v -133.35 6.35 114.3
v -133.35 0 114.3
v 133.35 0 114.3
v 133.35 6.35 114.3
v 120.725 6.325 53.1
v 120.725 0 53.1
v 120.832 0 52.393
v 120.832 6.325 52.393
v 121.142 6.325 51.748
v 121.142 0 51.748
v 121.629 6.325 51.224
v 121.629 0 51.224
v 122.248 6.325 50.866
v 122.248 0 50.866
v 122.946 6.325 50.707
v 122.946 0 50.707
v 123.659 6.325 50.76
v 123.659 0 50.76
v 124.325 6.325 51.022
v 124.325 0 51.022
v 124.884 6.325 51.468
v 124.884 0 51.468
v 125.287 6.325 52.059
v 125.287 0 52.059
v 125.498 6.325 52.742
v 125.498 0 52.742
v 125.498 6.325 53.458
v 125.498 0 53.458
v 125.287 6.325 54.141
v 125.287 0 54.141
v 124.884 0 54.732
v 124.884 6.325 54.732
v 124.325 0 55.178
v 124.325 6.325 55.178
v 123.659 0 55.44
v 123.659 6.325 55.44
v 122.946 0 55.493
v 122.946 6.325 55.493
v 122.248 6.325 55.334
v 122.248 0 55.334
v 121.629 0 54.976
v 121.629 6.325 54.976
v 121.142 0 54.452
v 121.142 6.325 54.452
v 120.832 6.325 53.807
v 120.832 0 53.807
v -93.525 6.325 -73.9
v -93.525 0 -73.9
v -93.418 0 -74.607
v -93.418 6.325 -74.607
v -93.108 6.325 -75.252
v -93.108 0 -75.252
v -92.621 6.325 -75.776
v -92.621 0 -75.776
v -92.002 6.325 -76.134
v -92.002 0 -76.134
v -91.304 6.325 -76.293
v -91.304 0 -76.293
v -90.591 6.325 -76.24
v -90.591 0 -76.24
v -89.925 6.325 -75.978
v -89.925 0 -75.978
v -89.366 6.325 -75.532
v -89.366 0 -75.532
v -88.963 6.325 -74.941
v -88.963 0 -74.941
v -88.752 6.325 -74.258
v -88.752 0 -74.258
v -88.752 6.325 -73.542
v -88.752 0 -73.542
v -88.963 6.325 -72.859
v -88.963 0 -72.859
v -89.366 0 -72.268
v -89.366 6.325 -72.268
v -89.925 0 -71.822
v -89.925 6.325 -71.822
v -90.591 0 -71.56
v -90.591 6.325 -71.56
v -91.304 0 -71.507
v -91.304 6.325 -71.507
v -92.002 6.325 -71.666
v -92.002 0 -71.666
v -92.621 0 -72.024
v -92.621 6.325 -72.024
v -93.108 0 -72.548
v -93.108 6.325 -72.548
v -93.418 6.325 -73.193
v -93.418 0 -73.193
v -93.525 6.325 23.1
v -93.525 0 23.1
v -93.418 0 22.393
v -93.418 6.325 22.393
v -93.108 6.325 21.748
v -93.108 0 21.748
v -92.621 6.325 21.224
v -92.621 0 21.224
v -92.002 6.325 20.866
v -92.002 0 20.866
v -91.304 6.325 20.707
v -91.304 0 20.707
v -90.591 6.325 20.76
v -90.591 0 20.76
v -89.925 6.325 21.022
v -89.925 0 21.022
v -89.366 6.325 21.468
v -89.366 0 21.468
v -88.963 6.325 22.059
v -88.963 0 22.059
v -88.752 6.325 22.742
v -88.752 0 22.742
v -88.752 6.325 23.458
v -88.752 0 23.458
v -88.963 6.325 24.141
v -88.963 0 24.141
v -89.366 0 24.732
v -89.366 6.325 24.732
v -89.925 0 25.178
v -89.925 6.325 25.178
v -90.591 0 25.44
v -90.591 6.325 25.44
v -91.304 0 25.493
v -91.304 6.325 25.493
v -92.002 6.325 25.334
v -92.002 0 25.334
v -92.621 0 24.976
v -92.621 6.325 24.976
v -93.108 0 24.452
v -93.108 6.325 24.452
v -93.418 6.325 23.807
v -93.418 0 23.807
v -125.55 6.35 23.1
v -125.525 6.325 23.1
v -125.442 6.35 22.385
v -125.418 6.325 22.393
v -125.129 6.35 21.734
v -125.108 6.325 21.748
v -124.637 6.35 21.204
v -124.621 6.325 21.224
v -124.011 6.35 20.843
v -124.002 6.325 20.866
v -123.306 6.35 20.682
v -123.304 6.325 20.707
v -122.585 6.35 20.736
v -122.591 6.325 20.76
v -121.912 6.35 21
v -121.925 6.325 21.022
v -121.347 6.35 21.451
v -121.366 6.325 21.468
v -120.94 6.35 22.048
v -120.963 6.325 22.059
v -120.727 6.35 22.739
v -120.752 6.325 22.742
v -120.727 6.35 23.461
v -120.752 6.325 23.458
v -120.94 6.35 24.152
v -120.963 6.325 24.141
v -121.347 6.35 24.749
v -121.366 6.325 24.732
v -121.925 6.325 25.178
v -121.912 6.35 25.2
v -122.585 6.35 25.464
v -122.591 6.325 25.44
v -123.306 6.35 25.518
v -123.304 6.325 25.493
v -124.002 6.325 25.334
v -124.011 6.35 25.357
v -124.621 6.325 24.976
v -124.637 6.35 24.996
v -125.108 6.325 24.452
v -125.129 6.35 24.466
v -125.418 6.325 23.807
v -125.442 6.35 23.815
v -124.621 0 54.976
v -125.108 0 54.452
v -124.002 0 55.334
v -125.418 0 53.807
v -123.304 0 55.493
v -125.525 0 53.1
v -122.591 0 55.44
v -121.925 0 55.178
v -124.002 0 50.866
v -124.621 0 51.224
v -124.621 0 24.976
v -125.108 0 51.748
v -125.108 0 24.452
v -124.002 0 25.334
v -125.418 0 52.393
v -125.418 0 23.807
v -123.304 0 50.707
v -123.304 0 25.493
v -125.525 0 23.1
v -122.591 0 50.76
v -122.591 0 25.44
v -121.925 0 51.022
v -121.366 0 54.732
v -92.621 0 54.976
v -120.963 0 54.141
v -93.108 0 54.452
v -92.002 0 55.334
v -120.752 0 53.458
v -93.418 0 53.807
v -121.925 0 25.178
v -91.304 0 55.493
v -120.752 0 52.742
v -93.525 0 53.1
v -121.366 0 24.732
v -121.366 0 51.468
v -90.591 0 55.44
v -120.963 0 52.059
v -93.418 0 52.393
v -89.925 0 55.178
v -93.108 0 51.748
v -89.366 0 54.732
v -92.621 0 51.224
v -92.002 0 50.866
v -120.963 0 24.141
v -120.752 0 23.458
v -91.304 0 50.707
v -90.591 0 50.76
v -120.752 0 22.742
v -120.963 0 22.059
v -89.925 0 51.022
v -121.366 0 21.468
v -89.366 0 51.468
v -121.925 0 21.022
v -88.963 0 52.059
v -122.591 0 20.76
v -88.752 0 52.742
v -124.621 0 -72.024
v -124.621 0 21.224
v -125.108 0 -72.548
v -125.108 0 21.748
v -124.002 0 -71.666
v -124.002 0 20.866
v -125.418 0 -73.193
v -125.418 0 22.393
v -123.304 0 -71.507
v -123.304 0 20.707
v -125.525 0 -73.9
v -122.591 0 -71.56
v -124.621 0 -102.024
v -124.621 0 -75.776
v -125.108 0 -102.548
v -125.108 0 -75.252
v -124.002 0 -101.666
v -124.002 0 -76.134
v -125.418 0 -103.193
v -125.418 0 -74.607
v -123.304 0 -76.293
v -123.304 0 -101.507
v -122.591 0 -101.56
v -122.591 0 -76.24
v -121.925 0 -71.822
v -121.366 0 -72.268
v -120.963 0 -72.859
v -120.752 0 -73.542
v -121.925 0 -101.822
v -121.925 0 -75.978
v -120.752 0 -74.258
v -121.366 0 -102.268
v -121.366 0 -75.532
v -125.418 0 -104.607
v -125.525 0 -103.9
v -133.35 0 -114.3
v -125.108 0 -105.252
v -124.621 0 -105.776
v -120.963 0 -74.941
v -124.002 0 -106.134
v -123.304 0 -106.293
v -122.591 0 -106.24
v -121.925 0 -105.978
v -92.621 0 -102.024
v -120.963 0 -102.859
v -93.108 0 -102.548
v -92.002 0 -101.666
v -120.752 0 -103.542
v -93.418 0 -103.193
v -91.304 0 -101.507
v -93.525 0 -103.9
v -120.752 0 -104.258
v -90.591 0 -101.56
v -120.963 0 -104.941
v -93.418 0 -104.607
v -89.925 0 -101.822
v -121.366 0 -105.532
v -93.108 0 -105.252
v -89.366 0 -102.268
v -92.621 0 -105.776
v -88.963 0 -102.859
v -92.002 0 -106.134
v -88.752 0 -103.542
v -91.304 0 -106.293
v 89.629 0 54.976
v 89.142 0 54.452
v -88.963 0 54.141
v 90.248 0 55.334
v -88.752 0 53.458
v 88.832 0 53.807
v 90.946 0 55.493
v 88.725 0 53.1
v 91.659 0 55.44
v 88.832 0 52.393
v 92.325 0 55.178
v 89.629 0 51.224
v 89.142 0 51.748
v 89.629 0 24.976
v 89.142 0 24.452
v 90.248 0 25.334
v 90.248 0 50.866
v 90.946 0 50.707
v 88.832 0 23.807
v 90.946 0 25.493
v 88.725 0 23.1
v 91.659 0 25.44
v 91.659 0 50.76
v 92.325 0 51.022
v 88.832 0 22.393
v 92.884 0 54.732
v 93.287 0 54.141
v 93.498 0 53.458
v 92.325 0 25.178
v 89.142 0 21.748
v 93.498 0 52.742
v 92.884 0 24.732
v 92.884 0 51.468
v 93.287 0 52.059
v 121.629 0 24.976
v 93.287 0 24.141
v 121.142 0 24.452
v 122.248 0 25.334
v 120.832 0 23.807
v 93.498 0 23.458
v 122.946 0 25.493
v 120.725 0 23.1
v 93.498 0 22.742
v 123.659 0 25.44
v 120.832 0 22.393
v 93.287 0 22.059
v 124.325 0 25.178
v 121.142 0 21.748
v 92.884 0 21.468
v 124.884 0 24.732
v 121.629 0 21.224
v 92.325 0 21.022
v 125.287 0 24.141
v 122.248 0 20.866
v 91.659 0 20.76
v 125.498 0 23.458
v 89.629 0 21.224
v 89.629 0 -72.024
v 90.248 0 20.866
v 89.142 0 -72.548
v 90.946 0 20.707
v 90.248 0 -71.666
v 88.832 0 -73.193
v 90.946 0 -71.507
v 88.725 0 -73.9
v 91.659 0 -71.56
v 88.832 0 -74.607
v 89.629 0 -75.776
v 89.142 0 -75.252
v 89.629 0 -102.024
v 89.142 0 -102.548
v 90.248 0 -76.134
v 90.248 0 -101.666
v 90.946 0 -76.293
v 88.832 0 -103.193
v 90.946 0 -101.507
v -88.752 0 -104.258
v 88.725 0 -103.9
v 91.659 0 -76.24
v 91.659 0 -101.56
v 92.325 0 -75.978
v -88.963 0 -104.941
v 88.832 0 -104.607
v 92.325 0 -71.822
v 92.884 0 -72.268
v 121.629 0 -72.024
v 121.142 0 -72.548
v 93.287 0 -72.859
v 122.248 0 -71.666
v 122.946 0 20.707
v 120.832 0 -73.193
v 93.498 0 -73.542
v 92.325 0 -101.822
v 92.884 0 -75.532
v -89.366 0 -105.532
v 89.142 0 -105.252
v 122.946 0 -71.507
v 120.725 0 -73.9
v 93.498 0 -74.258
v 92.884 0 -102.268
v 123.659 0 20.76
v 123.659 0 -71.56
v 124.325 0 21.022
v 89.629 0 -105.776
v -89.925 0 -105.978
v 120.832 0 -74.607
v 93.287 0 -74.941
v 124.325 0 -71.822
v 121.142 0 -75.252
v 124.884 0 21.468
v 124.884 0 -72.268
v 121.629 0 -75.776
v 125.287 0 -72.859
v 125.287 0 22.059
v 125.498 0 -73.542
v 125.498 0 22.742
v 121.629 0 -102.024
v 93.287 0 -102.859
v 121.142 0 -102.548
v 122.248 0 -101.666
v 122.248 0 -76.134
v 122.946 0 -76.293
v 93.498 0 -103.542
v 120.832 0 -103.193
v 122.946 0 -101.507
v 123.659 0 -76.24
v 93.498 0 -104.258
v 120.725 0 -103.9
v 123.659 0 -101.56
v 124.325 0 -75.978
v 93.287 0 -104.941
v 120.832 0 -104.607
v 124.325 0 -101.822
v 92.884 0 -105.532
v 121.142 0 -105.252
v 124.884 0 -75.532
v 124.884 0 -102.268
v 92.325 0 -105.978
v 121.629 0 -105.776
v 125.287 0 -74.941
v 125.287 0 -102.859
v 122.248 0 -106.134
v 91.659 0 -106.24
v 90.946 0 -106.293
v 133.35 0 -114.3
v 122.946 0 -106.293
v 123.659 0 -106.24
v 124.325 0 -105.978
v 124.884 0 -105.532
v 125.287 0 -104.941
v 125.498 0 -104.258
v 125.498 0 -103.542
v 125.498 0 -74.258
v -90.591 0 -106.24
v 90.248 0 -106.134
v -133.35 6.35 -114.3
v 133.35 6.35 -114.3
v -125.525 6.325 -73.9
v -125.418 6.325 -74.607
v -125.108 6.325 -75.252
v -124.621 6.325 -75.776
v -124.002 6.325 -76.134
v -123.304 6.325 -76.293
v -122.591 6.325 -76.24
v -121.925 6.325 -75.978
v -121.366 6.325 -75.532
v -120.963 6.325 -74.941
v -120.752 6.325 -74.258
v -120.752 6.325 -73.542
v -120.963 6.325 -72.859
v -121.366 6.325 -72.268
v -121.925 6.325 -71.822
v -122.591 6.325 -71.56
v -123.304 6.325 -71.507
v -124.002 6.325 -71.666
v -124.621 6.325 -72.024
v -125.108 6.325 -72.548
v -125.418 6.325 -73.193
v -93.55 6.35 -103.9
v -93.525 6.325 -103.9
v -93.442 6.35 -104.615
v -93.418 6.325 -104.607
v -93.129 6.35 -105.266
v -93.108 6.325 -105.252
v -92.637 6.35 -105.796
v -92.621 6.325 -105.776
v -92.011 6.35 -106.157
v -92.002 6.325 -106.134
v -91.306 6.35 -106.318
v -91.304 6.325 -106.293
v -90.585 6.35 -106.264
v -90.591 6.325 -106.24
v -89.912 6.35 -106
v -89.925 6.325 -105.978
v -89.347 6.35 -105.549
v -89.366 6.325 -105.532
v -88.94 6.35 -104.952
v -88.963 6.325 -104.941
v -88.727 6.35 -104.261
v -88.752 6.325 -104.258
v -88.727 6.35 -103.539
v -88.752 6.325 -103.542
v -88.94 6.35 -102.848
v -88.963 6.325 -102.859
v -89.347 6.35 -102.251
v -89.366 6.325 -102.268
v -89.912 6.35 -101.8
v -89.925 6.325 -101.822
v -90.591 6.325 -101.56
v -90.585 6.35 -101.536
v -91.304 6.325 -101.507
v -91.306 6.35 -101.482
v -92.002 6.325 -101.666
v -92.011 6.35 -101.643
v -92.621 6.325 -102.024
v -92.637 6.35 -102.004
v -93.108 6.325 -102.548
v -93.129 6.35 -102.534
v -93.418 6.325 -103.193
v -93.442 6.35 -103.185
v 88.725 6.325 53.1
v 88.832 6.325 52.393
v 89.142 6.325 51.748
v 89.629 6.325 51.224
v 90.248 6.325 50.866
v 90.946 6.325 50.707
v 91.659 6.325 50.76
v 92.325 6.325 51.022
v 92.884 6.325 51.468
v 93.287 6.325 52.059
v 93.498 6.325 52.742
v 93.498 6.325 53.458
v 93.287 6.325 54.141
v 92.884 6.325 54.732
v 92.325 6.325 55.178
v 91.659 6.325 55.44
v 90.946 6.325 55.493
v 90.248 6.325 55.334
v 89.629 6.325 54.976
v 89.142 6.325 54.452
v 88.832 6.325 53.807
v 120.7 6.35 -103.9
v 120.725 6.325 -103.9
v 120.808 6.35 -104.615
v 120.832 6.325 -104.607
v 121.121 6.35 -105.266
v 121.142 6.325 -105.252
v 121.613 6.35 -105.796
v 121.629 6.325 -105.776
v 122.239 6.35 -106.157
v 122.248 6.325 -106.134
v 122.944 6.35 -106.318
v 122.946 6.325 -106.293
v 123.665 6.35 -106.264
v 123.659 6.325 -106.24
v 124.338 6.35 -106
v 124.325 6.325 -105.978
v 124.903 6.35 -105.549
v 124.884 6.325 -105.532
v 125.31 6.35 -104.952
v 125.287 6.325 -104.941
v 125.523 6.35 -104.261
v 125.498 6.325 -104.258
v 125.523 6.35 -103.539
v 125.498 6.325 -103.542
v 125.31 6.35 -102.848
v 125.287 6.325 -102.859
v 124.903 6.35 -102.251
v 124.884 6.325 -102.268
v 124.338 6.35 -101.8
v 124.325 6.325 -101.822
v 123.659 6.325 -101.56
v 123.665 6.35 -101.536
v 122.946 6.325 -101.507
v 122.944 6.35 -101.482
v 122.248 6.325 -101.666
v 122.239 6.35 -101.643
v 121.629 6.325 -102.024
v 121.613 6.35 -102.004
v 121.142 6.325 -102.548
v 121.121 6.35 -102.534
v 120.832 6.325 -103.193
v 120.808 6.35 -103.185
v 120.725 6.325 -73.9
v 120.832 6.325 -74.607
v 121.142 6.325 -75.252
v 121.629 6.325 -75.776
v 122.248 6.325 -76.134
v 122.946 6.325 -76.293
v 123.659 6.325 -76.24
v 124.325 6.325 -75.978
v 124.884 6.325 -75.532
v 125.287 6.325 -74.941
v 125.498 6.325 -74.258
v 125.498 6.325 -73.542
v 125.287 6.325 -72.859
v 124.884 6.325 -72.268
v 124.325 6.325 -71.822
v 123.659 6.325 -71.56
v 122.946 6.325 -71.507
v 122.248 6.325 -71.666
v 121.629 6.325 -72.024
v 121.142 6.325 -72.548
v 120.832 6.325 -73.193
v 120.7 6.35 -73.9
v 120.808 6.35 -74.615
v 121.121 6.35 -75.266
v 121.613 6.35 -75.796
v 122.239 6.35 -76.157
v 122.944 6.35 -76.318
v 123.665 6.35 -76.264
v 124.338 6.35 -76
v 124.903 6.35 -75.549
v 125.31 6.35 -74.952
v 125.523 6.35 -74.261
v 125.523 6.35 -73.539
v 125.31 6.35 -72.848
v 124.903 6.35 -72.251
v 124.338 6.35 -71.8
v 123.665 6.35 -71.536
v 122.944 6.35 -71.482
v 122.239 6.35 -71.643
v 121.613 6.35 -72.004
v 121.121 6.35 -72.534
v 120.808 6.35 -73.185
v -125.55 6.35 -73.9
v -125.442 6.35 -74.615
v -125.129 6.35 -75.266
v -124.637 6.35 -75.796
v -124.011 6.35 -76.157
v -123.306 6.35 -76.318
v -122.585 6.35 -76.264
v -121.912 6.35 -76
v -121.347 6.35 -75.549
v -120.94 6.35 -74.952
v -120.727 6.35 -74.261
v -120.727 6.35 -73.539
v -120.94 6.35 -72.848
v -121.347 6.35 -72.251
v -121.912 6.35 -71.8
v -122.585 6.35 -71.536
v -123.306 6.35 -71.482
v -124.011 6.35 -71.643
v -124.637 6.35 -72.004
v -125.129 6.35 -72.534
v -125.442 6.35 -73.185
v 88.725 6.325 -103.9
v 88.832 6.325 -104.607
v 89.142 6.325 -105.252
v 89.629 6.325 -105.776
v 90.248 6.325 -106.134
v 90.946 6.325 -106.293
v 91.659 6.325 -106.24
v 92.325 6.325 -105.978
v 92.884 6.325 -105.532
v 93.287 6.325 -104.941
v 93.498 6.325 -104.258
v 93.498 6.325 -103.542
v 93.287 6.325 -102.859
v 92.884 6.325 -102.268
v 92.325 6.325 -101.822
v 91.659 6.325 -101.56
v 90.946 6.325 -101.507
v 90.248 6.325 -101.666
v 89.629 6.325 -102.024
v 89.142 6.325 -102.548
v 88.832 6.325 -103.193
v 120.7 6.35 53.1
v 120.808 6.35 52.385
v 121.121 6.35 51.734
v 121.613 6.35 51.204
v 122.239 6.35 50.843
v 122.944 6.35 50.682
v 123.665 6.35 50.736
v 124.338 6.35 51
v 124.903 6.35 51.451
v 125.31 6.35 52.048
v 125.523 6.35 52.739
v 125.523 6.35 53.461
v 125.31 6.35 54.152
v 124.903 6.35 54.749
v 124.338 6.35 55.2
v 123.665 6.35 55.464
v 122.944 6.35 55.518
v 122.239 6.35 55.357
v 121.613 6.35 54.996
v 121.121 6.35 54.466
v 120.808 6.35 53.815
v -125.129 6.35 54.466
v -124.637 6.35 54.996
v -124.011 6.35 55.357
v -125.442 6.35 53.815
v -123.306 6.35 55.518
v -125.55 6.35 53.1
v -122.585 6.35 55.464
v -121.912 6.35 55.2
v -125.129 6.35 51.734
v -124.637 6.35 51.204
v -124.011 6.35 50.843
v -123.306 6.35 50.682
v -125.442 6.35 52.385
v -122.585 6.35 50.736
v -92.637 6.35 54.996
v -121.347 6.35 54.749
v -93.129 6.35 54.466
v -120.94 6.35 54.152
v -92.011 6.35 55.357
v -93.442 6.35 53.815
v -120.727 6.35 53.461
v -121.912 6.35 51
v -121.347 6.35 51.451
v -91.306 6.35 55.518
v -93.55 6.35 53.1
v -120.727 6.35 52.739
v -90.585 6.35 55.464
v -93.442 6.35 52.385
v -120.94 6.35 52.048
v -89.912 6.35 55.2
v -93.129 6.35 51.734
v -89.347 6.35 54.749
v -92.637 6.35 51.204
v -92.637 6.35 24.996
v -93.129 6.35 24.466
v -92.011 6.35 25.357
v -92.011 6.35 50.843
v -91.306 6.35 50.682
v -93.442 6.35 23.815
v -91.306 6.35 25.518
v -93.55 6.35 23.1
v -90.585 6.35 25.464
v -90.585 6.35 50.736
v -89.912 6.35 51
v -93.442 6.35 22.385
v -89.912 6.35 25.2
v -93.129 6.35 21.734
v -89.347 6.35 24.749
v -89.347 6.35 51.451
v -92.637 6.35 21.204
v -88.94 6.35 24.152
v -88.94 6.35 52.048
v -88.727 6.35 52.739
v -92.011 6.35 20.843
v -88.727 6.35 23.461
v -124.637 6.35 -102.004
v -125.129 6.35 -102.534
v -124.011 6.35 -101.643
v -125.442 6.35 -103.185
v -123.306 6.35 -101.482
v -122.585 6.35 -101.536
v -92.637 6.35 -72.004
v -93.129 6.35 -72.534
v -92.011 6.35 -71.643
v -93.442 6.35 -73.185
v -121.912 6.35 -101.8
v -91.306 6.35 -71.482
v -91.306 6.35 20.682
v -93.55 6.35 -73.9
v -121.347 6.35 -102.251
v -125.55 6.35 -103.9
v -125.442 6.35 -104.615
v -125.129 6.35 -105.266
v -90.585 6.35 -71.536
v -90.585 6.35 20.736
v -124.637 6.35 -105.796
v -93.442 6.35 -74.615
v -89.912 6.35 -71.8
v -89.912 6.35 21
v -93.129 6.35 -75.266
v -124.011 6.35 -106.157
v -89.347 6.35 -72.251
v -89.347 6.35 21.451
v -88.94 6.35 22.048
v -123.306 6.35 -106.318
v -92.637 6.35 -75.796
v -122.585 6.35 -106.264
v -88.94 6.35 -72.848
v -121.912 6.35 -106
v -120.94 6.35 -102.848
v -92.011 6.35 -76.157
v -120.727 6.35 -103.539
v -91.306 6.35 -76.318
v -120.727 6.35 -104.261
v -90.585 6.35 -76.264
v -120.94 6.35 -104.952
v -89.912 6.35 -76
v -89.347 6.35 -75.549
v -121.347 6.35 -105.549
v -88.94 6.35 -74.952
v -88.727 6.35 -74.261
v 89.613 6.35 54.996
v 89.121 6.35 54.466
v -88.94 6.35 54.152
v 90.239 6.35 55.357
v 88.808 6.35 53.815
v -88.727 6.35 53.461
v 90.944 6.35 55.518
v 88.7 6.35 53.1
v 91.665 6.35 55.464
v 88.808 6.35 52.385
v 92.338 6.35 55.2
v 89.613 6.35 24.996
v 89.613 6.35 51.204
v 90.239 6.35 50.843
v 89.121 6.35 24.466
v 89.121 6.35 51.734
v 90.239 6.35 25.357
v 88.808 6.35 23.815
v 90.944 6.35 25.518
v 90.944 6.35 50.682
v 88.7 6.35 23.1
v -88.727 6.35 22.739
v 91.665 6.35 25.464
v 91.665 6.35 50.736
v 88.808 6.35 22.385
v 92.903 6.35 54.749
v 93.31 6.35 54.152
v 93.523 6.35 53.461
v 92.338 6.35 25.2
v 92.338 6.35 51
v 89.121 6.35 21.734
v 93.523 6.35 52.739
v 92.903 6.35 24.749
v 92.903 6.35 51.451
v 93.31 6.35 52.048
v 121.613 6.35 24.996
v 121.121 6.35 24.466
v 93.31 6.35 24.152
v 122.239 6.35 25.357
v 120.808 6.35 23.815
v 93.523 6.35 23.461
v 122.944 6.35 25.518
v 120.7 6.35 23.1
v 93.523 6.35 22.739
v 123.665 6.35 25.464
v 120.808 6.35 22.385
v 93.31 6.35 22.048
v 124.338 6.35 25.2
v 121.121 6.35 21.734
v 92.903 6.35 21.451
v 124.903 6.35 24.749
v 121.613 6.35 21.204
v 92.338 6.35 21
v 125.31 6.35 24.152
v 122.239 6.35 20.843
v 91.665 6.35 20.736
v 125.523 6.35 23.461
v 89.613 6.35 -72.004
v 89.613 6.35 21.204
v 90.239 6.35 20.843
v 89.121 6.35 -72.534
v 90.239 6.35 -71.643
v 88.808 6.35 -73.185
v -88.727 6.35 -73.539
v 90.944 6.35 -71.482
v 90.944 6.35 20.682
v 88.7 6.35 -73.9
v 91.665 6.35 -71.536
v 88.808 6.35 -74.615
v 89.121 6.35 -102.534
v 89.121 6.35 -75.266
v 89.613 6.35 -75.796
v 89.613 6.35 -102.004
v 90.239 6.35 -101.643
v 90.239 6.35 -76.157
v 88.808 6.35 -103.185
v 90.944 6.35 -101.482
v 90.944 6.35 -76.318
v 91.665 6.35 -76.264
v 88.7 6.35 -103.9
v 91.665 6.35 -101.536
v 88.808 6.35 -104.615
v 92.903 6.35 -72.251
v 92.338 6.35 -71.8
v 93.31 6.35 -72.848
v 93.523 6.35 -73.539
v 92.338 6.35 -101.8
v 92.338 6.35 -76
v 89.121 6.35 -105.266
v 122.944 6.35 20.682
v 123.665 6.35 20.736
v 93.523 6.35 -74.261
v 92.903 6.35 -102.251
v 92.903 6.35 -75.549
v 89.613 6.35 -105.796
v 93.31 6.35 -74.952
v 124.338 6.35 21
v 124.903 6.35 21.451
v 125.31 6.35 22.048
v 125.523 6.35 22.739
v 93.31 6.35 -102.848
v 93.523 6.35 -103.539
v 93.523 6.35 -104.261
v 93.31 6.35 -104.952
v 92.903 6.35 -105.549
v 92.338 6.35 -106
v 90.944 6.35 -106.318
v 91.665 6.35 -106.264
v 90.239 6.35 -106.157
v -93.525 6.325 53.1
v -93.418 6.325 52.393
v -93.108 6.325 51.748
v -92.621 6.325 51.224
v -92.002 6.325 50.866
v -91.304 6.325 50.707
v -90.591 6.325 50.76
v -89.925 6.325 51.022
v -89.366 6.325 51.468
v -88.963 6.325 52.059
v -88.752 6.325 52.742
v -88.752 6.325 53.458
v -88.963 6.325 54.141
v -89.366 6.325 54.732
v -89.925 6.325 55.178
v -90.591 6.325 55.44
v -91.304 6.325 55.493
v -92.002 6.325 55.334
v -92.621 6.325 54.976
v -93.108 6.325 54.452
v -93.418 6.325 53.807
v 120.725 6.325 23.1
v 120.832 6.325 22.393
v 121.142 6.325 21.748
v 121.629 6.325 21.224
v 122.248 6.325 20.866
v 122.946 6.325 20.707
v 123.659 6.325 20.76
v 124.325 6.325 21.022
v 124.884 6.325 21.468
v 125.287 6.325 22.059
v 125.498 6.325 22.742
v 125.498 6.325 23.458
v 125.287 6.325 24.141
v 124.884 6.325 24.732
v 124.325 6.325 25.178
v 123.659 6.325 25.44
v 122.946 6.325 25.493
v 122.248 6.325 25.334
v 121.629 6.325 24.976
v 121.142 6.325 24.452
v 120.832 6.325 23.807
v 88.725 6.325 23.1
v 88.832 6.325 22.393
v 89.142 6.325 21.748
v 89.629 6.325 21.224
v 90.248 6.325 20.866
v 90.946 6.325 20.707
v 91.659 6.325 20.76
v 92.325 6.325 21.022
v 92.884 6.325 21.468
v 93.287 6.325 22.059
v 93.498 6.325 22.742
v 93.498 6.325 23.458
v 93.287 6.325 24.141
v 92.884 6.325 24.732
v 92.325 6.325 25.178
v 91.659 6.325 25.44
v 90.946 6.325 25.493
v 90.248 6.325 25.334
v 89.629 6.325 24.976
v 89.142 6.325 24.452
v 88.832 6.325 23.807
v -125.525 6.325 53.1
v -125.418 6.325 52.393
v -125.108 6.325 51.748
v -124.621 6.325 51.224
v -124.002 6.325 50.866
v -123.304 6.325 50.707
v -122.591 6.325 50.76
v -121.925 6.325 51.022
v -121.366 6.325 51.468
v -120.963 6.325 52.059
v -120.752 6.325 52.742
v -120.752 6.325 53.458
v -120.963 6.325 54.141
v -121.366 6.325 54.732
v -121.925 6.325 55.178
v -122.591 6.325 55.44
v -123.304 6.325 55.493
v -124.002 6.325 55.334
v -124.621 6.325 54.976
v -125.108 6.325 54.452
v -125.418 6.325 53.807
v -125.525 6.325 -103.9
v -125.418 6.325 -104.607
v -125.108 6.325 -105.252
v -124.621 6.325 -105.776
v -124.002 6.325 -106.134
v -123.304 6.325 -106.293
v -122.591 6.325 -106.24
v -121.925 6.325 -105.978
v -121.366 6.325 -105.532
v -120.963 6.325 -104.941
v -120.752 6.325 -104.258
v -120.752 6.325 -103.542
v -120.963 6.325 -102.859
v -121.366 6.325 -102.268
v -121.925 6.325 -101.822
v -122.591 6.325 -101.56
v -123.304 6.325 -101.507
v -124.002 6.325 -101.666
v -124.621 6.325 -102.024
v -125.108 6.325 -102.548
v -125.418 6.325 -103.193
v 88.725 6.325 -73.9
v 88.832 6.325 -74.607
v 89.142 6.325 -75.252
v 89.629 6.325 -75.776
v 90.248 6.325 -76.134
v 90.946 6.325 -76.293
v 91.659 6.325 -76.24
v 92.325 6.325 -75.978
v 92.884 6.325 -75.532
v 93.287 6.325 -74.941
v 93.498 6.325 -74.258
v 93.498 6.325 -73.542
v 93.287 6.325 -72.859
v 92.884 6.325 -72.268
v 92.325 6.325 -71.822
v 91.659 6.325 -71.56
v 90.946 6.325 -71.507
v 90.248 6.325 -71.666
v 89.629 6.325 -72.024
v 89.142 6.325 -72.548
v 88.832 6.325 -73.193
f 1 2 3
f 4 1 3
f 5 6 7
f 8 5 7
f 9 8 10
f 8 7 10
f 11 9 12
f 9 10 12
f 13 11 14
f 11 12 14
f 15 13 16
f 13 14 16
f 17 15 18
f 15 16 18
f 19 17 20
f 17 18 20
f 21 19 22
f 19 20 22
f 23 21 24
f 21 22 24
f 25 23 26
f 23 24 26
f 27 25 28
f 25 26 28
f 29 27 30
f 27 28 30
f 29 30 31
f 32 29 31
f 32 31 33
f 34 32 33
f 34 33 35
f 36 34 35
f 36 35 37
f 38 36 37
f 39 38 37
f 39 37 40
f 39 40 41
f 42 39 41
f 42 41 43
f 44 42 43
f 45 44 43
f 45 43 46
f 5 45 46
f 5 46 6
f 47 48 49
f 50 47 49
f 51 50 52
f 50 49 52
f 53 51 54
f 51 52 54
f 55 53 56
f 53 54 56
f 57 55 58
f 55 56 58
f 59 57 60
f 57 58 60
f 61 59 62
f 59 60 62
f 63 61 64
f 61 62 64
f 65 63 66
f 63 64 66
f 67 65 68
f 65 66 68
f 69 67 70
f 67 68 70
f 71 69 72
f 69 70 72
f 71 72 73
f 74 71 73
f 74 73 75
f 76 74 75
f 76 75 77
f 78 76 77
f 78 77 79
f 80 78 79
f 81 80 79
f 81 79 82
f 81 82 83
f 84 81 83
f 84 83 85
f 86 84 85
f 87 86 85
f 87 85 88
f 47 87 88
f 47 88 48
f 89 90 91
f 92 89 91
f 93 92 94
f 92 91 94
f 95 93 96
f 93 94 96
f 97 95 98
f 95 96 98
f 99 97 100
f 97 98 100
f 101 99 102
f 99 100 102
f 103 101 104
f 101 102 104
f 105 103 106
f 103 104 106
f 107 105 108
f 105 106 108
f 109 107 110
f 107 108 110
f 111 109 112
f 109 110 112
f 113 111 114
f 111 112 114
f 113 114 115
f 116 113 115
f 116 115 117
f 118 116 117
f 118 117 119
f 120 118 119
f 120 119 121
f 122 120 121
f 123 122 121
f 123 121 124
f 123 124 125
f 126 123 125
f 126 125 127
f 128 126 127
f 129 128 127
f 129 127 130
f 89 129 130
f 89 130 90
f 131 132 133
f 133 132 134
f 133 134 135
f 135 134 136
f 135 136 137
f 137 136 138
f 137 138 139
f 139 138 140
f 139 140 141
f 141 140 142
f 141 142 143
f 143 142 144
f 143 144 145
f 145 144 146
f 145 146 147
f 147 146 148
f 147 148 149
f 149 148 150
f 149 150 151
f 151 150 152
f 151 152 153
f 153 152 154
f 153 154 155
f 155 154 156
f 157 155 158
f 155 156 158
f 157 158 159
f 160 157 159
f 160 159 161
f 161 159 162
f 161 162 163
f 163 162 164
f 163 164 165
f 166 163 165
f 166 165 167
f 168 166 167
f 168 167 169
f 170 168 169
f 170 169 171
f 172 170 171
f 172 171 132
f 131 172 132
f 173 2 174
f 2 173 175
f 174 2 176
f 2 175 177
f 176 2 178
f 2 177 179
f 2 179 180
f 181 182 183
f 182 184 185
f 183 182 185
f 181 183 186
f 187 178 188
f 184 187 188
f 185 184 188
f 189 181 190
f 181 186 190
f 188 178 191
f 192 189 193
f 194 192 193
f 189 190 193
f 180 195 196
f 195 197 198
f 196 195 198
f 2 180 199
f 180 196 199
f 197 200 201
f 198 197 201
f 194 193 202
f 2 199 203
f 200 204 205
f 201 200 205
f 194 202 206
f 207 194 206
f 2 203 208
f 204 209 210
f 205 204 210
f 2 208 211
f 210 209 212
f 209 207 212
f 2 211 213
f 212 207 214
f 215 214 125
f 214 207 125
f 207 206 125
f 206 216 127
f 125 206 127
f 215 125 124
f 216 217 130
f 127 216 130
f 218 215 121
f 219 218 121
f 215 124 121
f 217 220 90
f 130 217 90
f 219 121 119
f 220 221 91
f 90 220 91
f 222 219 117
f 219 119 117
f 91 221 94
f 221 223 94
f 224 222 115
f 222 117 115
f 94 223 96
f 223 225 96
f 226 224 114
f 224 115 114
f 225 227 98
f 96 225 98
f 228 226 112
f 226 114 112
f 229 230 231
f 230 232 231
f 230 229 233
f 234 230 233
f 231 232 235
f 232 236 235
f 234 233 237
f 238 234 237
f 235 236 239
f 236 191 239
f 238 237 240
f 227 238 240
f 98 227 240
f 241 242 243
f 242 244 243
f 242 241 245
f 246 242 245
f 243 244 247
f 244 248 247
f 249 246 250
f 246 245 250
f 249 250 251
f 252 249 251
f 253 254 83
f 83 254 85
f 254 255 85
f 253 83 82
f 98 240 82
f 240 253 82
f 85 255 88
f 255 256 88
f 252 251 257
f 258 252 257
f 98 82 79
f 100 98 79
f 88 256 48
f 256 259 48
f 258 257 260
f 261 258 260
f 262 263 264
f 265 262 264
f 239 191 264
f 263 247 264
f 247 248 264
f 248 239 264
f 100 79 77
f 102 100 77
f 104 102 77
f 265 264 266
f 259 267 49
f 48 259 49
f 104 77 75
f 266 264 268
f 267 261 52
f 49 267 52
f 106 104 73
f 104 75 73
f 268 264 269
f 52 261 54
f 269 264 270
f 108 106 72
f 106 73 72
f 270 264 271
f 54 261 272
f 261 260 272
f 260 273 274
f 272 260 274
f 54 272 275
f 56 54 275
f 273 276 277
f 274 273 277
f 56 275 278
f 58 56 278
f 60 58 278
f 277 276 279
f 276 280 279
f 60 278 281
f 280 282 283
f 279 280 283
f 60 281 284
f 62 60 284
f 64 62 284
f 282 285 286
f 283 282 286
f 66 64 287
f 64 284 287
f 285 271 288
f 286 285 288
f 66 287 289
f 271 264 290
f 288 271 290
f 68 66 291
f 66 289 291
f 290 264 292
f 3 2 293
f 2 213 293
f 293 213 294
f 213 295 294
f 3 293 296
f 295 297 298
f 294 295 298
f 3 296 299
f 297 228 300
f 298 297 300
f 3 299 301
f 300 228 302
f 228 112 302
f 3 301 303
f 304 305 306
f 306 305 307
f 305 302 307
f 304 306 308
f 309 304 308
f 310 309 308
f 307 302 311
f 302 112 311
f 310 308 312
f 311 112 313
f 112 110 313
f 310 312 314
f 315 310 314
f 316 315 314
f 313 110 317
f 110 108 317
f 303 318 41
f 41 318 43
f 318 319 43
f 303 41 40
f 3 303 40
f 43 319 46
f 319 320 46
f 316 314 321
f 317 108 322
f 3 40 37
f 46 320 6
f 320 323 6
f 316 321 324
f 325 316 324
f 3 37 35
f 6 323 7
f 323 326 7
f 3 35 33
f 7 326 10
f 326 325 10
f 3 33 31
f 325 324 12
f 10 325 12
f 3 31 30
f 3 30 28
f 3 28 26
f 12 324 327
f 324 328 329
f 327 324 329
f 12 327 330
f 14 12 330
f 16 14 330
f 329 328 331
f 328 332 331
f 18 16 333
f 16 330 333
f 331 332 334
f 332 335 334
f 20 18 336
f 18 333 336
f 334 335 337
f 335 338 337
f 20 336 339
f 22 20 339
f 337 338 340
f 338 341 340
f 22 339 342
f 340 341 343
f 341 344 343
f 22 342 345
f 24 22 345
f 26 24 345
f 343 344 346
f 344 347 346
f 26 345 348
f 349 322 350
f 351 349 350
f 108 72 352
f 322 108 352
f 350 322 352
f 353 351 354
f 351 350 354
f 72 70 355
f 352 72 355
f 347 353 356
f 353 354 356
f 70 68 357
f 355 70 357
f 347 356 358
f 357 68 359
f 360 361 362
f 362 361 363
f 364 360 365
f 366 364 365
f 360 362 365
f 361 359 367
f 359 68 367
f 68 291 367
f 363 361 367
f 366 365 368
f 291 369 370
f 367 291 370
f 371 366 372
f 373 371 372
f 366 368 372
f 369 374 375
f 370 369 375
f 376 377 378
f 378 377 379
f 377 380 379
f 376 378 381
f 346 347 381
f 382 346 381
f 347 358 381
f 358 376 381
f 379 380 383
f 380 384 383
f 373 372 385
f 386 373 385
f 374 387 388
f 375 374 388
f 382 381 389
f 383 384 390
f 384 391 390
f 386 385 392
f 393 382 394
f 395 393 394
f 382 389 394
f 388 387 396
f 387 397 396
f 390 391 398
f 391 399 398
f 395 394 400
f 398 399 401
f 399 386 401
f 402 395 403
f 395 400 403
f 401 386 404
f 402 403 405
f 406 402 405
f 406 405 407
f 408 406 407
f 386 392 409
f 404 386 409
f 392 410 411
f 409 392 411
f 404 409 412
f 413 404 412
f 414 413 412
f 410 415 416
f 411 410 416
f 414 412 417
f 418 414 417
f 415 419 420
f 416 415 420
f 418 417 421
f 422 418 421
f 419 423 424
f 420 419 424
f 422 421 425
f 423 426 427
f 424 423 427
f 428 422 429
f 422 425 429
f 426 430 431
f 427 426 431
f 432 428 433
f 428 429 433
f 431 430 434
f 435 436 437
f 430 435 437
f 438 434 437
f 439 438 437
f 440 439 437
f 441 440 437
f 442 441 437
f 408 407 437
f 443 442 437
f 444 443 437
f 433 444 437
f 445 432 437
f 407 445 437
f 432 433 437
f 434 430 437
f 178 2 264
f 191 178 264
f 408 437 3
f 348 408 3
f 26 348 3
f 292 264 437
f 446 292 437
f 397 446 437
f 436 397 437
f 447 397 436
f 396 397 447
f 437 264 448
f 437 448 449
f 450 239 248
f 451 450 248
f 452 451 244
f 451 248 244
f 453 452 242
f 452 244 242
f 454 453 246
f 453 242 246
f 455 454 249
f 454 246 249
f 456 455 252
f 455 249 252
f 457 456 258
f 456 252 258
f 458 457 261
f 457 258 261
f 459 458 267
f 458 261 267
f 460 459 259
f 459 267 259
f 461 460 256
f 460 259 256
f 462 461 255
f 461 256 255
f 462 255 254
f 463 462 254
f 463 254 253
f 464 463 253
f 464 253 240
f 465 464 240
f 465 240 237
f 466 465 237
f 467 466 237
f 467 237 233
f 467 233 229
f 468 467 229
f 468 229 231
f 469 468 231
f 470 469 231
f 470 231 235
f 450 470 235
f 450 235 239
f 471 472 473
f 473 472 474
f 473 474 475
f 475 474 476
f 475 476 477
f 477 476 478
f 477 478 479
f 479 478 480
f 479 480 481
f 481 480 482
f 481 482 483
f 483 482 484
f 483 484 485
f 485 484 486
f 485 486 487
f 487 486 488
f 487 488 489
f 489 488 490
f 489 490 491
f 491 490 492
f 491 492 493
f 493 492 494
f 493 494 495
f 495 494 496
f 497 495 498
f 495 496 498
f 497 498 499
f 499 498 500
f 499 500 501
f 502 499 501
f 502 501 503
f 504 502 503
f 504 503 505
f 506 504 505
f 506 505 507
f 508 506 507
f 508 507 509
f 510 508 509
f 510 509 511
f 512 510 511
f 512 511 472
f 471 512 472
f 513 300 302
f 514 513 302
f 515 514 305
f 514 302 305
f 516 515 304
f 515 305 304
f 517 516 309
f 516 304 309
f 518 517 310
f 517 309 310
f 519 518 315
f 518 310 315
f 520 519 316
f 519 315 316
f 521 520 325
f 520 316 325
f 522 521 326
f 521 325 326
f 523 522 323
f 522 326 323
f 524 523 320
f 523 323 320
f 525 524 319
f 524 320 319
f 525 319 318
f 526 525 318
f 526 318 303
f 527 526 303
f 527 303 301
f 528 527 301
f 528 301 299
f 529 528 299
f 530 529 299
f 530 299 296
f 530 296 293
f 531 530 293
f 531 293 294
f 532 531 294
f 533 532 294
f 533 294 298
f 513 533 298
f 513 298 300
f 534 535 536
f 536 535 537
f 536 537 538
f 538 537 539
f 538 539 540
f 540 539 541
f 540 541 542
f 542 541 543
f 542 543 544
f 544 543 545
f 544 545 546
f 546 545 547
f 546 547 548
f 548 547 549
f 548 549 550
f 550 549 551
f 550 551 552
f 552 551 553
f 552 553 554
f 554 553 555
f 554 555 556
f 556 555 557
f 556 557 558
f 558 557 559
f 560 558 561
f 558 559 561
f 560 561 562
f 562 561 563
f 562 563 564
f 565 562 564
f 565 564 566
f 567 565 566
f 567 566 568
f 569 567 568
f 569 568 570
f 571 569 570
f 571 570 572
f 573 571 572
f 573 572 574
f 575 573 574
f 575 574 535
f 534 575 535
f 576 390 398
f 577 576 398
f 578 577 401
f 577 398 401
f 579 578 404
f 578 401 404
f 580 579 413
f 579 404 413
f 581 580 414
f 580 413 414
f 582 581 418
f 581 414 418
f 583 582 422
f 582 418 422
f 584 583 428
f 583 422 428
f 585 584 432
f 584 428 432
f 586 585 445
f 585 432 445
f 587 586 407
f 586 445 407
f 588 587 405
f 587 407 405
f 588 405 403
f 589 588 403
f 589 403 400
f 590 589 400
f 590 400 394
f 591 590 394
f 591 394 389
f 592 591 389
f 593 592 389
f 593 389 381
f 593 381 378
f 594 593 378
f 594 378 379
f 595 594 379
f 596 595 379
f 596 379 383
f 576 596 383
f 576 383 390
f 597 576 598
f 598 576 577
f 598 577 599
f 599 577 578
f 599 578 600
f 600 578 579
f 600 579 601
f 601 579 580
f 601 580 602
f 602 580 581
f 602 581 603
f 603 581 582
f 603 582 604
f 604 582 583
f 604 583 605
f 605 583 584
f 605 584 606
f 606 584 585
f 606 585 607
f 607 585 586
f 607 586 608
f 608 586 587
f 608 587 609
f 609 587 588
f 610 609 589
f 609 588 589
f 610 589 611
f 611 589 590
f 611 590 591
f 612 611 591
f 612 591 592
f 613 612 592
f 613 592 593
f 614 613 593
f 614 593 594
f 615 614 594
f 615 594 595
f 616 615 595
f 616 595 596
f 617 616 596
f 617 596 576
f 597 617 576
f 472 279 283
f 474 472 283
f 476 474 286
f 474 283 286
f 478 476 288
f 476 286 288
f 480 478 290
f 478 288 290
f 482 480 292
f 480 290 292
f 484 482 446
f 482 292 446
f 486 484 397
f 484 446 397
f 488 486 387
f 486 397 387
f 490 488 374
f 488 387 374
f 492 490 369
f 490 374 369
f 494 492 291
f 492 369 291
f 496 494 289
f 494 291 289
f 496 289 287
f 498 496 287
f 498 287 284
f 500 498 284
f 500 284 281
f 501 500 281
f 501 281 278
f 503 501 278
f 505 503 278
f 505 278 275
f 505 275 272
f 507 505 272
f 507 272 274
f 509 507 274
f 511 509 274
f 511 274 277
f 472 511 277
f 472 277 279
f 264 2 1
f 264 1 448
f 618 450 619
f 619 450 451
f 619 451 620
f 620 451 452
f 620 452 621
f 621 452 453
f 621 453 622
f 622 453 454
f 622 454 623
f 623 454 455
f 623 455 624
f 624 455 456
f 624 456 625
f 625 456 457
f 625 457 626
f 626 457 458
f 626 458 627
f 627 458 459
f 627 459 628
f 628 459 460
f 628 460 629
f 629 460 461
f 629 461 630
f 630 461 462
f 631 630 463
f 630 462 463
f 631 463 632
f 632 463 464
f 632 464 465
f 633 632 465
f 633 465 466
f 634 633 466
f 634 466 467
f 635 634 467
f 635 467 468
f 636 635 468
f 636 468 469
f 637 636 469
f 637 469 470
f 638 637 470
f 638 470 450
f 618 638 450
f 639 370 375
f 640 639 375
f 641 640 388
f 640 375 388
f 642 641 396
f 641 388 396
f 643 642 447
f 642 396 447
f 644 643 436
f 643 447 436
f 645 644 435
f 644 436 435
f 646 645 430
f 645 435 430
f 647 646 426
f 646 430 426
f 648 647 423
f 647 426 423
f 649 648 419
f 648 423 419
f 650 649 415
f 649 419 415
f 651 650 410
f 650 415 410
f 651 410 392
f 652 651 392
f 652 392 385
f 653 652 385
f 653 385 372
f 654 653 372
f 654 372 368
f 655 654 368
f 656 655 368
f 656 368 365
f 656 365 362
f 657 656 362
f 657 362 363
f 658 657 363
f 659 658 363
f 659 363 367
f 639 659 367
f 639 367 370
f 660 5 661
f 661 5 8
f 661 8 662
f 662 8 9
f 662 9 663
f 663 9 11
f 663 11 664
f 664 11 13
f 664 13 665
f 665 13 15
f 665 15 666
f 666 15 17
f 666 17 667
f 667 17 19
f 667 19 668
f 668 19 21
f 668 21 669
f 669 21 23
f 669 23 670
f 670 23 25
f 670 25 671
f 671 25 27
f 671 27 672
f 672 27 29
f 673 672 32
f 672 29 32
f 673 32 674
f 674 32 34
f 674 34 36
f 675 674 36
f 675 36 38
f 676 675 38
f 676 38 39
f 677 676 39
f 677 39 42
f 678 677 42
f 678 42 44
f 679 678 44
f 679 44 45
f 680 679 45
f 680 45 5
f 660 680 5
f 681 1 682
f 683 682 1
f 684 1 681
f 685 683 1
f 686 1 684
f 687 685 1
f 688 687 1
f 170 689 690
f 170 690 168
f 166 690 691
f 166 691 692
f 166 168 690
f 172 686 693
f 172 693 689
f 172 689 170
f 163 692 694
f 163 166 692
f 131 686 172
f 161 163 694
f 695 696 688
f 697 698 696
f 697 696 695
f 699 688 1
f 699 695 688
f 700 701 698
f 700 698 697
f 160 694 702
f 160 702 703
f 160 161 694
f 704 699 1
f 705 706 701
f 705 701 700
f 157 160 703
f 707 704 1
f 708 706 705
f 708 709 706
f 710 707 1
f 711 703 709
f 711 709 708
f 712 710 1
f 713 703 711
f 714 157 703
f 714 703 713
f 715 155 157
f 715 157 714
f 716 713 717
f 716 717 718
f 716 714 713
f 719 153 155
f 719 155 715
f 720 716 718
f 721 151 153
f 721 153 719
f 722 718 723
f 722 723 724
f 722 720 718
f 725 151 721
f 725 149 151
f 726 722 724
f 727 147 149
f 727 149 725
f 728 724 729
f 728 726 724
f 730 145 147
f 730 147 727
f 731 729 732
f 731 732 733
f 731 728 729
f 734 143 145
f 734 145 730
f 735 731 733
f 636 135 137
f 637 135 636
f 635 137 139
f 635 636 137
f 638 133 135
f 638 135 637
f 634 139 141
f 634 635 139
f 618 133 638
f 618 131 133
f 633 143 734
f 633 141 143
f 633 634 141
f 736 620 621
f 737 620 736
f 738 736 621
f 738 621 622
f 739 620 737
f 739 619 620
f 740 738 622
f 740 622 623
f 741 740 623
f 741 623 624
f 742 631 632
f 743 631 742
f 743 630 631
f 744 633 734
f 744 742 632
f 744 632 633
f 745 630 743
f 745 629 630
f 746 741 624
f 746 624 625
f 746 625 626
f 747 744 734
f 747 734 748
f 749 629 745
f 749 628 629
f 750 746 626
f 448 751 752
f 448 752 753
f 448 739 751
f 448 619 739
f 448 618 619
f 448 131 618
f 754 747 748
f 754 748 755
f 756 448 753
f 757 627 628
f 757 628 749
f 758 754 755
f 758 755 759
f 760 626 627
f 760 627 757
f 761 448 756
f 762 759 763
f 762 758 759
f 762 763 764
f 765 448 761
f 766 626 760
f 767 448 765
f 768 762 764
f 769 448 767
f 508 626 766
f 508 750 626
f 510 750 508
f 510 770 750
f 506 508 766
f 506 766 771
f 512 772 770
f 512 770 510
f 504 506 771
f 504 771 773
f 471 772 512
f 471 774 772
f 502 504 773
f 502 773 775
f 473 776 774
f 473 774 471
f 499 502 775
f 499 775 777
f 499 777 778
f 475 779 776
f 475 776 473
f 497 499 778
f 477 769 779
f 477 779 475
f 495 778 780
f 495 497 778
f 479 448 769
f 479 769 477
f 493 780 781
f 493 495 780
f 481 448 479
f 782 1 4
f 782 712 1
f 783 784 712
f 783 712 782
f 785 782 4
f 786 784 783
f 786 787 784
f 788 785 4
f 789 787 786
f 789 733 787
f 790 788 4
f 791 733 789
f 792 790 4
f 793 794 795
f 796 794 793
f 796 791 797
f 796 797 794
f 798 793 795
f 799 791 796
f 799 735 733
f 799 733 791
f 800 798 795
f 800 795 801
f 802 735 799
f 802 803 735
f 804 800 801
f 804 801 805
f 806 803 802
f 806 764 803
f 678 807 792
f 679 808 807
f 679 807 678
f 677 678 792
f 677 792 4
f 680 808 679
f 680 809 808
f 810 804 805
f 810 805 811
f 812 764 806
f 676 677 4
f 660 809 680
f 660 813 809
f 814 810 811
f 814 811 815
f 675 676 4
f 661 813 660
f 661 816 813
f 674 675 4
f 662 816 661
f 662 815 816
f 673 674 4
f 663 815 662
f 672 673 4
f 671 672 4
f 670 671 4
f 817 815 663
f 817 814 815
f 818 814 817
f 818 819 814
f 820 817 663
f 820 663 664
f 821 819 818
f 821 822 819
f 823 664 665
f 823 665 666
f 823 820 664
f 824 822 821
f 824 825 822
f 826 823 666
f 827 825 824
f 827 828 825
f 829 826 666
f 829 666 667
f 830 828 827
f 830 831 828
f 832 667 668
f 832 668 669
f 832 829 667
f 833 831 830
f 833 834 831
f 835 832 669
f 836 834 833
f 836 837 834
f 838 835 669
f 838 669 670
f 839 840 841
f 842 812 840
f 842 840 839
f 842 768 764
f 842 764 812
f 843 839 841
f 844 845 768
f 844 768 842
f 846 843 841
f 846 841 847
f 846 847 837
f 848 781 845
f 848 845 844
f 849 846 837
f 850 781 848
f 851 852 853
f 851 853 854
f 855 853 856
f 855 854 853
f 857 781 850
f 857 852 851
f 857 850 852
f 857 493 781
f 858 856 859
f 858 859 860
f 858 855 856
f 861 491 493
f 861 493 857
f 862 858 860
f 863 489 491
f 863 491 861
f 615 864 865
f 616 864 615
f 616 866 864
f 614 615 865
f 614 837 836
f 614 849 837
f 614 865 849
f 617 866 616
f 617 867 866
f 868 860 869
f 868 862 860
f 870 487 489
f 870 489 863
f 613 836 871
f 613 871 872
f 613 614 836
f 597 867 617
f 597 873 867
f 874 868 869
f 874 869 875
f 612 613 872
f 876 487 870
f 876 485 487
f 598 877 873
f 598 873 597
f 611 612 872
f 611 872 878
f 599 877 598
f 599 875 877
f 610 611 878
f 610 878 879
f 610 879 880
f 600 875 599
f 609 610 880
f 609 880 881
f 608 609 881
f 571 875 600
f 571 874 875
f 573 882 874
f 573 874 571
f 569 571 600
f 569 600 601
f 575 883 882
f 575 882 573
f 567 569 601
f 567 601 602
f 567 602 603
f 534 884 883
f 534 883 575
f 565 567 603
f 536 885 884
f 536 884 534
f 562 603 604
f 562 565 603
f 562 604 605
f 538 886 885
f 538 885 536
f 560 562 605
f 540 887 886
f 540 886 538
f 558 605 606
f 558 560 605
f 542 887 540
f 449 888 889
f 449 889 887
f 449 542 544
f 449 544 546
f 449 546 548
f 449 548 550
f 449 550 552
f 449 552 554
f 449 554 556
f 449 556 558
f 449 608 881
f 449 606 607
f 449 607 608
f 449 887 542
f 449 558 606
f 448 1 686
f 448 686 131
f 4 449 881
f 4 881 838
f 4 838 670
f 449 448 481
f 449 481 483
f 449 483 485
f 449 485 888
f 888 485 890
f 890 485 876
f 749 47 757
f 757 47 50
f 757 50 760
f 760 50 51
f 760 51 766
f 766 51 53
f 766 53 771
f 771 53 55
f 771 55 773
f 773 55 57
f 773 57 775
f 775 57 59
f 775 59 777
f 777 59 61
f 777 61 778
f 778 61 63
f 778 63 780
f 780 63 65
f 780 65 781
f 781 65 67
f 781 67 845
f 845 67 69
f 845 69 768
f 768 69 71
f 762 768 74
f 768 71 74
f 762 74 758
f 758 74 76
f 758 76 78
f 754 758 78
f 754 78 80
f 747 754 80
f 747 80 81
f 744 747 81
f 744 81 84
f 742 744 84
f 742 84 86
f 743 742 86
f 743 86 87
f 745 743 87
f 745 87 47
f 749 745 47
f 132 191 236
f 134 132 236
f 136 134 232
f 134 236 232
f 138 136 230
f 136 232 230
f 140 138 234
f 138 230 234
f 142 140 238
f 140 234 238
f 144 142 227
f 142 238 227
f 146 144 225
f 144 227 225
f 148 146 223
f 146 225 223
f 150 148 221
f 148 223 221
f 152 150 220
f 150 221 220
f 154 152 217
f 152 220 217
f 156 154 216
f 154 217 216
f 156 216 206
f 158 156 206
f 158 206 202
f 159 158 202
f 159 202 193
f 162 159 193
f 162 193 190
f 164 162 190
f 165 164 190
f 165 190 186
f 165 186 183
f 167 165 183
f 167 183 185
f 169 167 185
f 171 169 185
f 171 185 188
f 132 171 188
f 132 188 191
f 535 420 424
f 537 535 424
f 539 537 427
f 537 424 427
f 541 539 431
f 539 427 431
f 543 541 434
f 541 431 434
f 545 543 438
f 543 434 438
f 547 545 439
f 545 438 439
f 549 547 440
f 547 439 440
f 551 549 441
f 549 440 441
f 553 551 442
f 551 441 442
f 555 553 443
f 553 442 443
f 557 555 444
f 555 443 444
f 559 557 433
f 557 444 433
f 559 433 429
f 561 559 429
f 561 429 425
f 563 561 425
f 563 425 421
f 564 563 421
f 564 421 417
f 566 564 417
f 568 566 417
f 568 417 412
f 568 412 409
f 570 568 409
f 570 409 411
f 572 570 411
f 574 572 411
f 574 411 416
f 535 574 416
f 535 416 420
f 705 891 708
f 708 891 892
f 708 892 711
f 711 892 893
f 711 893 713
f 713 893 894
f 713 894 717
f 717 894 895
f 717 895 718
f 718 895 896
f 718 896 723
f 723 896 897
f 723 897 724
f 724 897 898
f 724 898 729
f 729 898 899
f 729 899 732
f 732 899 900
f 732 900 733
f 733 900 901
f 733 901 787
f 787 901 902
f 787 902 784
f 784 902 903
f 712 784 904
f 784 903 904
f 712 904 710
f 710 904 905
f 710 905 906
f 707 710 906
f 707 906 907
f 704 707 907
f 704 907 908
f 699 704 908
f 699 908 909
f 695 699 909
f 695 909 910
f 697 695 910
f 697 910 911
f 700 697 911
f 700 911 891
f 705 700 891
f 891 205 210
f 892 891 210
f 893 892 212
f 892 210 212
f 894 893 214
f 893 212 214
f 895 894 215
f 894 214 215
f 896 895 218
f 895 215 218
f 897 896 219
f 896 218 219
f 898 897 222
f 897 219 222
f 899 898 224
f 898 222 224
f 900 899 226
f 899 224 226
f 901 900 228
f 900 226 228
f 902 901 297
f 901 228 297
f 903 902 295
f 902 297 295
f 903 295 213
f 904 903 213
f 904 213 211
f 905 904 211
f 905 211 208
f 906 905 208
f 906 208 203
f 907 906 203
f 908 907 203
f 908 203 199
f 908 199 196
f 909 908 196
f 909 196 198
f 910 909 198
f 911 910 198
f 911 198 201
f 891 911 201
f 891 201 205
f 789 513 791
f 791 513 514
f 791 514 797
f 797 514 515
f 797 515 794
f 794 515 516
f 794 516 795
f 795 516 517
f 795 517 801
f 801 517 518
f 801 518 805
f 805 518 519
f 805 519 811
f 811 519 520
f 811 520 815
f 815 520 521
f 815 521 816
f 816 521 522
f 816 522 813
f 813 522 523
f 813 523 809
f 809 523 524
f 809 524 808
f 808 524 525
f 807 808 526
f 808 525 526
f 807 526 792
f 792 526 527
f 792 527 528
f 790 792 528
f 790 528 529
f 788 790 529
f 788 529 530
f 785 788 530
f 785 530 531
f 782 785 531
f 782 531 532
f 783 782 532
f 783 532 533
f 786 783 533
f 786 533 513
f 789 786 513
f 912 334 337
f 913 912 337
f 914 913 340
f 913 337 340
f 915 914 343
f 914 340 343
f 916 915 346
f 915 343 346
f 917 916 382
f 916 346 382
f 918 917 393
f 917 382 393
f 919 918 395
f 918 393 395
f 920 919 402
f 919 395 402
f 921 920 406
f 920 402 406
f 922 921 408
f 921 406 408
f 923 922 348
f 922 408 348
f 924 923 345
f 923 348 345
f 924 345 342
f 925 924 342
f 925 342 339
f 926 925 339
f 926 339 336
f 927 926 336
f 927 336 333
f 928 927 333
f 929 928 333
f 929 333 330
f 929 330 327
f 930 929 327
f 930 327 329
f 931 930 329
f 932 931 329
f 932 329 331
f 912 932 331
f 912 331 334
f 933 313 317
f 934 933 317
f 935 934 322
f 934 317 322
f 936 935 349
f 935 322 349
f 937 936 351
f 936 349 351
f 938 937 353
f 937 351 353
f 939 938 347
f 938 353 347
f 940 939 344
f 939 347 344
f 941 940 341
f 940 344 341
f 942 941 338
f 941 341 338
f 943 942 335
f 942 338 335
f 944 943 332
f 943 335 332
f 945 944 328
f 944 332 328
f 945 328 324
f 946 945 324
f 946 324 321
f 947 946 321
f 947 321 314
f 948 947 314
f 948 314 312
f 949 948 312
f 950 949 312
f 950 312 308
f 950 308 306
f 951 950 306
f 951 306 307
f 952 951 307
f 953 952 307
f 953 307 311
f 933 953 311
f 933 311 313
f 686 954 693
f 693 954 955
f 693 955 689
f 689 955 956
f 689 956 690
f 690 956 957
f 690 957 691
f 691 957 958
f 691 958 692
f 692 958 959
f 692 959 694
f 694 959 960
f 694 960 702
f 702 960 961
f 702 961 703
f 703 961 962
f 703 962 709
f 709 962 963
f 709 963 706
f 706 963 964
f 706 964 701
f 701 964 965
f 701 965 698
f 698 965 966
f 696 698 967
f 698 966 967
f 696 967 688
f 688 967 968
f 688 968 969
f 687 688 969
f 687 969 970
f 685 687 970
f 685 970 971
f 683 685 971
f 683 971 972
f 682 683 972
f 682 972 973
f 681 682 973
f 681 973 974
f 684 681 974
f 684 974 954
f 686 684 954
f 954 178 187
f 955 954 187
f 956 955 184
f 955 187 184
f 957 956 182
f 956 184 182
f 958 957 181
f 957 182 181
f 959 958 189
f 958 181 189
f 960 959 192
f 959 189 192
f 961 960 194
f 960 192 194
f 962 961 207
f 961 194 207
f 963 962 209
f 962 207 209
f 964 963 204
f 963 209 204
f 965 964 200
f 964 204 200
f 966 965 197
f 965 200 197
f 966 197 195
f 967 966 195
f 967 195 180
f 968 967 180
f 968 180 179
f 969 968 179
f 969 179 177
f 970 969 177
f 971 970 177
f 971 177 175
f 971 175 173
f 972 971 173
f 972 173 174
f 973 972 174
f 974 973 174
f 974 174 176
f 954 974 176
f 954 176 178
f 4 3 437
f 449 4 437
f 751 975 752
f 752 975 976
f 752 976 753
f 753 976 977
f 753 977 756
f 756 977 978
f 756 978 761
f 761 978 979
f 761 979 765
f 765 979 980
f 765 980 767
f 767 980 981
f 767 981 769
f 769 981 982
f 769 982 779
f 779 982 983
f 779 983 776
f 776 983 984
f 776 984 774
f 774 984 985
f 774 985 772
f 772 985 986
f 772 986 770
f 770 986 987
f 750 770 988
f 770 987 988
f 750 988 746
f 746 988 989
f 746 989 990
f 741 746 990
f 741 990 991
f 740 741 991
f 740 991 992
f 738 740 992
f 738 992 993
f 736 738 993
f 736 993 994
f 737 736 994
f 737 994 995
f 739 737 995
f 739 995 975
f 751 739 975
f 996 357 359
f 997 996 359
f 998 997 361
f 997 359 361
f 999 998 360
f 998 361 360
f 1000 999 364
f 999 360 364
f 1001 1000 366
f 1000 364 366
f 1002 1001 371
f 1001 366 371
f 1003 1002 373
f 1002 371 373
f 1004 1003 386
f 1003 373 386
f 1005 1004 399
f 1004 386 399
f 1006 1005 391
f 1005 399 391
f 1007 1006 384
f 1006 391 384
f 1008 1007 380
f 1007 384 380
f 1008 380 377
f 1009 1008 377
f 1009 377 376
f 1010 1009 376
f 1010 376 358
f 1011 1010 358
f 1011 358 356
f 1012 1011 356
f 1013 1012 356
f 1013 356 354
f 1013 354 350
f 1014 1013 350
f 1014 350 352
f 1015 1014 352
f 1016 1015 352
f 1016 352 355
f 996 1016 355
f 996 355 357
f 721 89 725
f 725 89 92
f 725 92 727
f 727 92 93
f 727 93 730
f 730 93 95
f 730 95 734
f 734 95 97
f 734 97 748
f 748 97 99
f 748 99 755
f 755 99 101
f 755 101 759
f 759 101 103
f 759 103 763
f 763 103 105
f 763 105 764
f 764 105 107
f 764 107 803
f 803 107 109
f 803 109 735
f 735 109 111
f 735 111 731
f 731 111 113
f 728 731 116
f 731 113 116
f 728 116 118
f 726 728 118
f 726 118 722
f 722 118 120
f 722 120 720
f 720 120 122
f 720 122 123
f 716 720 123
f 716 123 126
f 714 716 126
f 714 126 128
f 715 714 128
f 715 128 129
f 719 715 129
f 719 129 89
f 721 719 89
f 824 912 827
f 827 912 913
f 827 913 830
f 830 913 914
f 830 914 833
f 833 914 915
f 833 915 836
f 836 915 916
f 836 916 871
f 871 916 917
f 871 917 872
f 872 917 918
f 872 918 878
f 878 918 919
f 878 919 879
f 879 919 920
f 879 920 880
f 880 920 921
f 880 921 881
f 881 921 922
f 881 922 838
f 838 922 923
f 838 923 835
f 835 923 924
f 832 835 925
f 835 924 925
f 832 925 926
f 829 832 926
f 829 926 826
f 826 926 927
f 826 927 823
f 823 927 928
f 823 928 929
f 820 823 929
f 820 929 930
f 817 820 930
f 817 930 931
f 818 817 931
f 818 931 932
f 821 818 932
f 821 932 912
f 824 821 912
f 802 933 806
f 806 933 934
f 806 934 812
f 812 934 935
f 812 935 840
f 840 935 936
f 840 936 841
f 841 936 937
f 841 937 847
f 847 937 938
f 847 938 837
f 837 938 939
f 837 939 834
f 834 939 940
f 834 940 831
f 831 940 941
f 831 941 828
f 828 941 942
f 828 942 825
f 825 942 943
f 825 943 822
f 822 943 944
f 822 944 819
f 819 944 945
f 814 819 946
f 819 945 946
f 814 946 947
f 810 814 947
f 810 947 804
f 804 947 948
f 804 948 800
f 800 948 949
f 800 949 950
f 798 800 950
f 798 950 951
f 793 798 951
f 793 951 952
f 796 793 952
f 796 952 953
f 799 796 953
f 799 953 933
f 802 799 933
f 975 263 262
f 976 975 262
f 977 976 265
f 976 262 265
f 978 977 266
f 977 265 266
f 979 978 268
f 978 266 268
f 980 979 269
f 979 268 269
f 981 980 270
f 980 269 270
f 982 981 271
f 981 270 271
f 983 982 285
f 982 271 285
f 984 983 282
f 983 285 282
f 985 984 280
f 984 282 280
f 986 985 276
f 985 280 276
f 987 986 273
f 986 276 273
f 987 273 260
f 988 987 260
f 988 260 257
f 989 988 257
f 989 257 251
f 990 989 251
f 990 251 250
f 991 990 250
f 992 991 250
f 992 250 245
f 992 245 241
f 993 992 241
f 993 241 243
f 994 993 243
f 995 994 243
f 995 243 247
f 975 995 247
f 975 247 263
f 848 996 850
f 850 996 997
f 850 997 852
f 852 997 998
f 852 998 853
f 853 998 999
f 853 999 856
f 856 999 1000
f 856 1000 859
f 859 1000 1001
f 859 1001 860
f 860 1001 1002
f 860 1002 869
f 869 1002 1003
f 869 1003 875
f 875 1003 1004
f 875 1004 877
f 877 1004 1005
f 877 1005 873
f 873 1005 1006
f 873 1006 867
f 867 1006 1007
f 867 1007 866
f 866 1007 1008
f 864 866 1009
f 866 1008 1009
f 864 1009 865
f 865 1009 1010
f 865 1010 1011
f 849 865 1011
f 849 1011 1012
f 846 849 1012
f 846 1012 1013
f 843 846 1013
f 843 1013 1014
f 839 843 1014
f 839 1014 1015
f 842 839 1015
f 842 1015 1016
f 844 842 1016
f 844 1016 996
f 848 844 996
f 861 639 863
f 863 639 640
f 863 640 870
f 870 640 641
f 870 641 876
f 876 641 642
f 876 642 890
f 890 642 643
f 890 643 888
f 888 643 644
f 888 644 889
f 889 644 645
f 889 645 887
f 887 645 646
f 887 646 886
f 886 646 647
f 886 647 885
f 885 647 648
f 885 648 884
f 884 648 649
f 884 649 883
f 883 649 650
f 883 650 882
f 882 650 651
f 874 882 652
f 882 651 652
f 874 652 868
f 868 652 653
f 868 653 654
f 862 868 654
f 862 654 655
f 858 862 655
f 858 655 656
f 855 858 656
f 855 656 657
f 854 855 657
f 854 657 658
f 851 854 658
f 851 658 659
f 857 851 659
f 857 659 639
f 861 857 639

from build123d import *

# Parameters (mm, degrees)
SKETCH1_W                      = 266.7
SKETCH1_H                      = 228.6
BOSS_EXTRUDE1_DEPTH            = 6.35
M4_CLEARANCE_HOLE1_D           = 4.8
M4_CLEARANCE_HOLE1_DEPTH       = 6.35
M4_CLEARANCE_HOLE1_CSINK_D     = 4.85
M4_CLEARANCE_HOLE1_CSINK_ANGLE = 90


with BuildPart() as part:
    # Sketch1 → Boss-Extrude1 (new body)
    with BuildSketch(Plane(origin=(0, 0, 0), x_dir=(1, 0, 0), z_dir=(0, 1, 0))):
        Rectangle(SKETCH1_W, SKETCH1_H)
    extrude(amount=BOSS_EXTRUDE1_DEPTH)

    # M4 Clearance Hole1
    with Locations(Plane(origin=(0, 6.35, 0), x_dir=(1, 0, 0), z_dir=(0, 1, 0))):
        with Locations((123.125, 103.9), (91.125, 103.9), (91.125, 73.9), (123.125, -53.1), (123.125, -23.1), (123.125, 73.9), (-123.125, 103.9), (-91.125, 103.9), (-91.125, 73.9), (91.125, -53.1), (-123.125, -53.1), (-91.125, -53.1), (-91.125, -23.1), (-123.125, -23.1), (-123.125, 73.9), (91.125, -23.1)):
            CounterSinkHole(M4_CLEARANCE_HOLE1_D / 2, M4_CLEARANCE_HOLE1_CSINK_D / 2, depth=M4_CLEARANCE_HOLE1_DEPTH, counter_sink_angle=M4_CLEARANCE_HOLE1_CSINK_ANGLE)


solid = part.part
